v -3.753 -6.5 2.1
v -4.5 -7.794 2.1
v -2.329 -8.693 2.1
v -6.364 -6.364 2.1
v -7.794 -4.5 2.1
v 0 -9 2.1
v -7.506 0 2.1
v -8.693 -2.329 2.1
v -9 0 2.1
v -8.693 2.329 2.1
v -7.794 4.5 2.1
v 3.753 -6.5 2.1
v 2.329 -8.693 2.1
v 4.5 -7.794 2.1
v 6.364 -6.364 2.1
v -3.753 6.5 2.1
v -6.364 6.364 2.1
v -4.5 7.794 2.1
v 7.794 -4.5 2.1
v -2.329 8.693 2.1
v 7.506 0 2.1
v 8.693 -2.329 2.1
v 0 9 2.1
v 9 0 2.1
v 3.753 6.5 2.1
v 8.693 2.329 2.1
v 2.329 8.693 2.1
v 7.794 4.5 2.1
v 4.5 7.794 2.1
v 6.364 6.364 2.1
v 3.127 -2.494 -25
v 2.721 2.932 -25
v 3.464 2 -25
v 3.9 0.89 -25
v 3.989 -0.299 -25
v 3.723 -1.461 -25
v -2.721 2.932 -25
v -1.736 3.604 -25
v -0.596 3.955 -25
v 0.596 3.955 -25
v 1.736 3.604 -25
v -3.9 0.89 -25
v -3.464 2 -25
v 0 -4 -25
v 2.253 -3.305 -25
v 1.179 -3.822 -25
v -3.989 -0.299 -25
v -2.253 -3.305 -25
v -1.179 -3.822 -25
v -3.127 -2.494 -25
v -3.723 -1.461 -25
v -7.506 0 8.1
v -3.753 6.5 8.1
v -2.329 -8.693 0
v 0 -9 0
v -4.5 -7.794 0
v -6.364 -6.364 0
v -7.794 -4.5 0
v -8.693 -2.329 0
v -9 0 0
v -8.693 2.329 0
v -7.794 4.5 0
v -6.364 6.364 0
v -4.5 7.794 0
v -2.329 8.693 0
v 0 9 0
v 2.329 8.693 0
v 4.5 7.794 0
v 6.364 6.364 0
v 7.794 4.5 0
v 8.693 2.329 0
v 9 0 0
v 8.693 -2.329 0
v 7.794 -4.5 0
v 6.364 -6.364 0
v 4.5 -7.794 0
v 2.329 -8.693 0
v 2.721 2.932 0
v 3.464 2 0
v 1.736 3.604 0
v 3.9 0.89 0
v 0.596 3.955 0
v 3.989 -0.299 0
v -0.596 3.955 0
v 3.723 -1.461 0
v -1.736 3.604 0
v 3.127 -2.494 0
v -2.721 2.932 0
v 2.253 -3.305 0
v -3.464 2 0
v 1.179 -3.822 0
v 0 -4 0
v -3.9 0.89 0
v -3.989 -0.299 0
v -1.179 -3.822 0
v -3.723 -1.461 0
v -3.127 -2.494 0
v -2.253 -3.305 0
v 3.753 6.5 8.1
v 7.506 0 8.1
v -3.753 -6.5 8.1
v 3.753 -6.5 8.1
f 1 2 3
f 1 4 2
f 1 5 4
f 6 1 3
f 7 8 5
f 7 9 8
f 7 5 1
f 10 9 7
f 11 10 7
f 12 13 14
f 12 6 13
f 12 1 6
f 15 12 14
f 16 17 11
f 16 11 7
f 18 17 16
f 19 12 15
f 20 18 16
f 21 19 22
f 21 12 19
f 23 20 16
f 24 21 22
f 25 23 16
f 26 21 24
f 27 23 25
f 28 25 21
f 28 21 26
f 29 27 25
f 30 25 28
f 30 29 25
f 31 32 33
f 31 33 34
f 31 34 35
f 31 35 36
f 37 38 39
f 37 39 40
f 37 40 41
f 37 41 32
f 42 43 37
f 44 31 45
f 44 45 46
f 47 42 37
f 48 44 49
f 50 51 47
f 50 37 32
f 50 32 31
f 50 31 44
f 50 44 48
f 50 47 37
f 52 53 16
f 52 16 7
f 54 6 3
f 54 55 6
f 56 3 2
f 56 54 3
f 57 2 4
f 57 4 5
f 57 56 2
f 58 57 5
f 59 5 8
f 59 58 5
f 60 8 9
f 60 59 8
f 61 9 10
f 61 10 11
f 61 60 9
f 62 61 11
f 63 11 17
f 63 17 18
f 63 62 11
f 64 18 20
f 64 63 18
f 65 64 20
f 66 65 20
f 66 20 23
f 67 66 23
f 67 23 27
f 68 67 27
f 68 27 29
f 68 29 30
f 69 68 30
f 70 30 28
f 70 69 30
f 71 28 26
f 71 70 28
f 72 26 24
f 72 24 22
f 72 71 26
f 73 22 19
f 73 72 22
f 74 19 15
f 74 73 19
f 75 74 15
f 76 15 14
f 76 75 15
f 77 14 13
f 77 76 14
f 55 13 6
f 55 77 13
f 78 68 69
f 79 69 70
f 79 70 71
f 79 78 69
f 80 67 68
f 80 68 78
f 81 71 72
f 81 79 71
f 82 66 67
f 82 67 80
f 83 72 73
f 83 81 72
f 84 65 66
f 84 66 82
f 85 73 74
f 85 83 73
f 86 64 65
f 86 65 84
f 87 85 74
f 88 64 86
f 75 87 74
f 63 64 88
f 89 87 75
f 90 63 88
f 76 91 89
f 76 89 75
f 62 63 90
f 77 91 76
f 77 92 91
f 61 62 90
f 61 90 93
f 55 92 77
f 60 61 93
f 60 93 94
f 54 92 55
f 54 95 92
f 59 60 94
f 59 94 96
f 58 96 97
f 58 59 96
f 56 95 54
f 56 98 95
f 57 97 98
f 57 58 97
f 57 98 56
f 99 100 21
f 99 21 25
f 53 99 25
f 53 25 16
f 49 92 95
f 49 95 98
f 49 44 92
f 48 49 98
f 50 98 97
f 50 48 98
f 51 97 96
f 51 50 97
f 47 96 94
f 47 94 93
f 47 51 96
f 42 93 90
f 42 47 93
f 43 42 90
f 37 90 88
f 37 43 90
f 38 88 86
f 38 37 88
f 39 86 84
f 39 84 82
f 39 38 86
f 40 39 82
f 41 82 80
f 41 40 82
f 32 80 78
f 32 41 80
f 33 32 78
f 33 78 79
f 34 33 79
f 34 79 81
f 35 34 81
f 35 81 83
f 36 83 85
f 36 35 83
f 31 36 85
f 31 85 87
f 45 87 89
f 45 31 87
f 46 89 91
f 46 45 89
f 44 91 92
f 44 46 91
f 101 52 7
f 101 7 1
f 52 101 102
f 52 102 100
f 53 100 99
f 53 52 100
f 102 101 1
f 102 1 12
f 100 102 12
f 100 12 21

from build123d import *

# Parameters (mm, degrees)
SKETCH2_OUTSIDE_W  = 28.352
SKETCH2_OUTSIDE_H  = 28.352
CUT_EXTRUDE1_DEPTH = 6


with BuildPart() as part:
    # Sketch1 → Revolve1 (revolve)
    with BuildSketch(Plane(origin=(0, 0, 0), x_dir=(0, 0, -1), z_dir=(1, 0, 0))):
        Polygon((-8.1, 0), (-8.1, 9), (0, 9), (0, 4), (25, 4), (25, 0), align=None)
    revolve(axis=Axis((0, 0, 5.584882278), (0, 0, -1)))

    # Sketch2 outside → Cut-Extrude1 (cut)
    with BuildSketch(Plane.XY.offset(8.1)):
        Rectangle(SKETCH2_OUTSIDE_W, SKETCH2_OUTSIDE_H)
        Polygon((3.75277675, -6.5), (7.505553499, 0), (3.75277675, 6.5), (-3.75277675, 6.5), (-7.505553499, 0), (-3.75277675, -6.5), align=None, mode=Mode.SUBTRACT)
    extrude(amount=-CUT_EXTRUDE1_DEPTH, mode=Mode.SUBTRACT)


solid = part.part
